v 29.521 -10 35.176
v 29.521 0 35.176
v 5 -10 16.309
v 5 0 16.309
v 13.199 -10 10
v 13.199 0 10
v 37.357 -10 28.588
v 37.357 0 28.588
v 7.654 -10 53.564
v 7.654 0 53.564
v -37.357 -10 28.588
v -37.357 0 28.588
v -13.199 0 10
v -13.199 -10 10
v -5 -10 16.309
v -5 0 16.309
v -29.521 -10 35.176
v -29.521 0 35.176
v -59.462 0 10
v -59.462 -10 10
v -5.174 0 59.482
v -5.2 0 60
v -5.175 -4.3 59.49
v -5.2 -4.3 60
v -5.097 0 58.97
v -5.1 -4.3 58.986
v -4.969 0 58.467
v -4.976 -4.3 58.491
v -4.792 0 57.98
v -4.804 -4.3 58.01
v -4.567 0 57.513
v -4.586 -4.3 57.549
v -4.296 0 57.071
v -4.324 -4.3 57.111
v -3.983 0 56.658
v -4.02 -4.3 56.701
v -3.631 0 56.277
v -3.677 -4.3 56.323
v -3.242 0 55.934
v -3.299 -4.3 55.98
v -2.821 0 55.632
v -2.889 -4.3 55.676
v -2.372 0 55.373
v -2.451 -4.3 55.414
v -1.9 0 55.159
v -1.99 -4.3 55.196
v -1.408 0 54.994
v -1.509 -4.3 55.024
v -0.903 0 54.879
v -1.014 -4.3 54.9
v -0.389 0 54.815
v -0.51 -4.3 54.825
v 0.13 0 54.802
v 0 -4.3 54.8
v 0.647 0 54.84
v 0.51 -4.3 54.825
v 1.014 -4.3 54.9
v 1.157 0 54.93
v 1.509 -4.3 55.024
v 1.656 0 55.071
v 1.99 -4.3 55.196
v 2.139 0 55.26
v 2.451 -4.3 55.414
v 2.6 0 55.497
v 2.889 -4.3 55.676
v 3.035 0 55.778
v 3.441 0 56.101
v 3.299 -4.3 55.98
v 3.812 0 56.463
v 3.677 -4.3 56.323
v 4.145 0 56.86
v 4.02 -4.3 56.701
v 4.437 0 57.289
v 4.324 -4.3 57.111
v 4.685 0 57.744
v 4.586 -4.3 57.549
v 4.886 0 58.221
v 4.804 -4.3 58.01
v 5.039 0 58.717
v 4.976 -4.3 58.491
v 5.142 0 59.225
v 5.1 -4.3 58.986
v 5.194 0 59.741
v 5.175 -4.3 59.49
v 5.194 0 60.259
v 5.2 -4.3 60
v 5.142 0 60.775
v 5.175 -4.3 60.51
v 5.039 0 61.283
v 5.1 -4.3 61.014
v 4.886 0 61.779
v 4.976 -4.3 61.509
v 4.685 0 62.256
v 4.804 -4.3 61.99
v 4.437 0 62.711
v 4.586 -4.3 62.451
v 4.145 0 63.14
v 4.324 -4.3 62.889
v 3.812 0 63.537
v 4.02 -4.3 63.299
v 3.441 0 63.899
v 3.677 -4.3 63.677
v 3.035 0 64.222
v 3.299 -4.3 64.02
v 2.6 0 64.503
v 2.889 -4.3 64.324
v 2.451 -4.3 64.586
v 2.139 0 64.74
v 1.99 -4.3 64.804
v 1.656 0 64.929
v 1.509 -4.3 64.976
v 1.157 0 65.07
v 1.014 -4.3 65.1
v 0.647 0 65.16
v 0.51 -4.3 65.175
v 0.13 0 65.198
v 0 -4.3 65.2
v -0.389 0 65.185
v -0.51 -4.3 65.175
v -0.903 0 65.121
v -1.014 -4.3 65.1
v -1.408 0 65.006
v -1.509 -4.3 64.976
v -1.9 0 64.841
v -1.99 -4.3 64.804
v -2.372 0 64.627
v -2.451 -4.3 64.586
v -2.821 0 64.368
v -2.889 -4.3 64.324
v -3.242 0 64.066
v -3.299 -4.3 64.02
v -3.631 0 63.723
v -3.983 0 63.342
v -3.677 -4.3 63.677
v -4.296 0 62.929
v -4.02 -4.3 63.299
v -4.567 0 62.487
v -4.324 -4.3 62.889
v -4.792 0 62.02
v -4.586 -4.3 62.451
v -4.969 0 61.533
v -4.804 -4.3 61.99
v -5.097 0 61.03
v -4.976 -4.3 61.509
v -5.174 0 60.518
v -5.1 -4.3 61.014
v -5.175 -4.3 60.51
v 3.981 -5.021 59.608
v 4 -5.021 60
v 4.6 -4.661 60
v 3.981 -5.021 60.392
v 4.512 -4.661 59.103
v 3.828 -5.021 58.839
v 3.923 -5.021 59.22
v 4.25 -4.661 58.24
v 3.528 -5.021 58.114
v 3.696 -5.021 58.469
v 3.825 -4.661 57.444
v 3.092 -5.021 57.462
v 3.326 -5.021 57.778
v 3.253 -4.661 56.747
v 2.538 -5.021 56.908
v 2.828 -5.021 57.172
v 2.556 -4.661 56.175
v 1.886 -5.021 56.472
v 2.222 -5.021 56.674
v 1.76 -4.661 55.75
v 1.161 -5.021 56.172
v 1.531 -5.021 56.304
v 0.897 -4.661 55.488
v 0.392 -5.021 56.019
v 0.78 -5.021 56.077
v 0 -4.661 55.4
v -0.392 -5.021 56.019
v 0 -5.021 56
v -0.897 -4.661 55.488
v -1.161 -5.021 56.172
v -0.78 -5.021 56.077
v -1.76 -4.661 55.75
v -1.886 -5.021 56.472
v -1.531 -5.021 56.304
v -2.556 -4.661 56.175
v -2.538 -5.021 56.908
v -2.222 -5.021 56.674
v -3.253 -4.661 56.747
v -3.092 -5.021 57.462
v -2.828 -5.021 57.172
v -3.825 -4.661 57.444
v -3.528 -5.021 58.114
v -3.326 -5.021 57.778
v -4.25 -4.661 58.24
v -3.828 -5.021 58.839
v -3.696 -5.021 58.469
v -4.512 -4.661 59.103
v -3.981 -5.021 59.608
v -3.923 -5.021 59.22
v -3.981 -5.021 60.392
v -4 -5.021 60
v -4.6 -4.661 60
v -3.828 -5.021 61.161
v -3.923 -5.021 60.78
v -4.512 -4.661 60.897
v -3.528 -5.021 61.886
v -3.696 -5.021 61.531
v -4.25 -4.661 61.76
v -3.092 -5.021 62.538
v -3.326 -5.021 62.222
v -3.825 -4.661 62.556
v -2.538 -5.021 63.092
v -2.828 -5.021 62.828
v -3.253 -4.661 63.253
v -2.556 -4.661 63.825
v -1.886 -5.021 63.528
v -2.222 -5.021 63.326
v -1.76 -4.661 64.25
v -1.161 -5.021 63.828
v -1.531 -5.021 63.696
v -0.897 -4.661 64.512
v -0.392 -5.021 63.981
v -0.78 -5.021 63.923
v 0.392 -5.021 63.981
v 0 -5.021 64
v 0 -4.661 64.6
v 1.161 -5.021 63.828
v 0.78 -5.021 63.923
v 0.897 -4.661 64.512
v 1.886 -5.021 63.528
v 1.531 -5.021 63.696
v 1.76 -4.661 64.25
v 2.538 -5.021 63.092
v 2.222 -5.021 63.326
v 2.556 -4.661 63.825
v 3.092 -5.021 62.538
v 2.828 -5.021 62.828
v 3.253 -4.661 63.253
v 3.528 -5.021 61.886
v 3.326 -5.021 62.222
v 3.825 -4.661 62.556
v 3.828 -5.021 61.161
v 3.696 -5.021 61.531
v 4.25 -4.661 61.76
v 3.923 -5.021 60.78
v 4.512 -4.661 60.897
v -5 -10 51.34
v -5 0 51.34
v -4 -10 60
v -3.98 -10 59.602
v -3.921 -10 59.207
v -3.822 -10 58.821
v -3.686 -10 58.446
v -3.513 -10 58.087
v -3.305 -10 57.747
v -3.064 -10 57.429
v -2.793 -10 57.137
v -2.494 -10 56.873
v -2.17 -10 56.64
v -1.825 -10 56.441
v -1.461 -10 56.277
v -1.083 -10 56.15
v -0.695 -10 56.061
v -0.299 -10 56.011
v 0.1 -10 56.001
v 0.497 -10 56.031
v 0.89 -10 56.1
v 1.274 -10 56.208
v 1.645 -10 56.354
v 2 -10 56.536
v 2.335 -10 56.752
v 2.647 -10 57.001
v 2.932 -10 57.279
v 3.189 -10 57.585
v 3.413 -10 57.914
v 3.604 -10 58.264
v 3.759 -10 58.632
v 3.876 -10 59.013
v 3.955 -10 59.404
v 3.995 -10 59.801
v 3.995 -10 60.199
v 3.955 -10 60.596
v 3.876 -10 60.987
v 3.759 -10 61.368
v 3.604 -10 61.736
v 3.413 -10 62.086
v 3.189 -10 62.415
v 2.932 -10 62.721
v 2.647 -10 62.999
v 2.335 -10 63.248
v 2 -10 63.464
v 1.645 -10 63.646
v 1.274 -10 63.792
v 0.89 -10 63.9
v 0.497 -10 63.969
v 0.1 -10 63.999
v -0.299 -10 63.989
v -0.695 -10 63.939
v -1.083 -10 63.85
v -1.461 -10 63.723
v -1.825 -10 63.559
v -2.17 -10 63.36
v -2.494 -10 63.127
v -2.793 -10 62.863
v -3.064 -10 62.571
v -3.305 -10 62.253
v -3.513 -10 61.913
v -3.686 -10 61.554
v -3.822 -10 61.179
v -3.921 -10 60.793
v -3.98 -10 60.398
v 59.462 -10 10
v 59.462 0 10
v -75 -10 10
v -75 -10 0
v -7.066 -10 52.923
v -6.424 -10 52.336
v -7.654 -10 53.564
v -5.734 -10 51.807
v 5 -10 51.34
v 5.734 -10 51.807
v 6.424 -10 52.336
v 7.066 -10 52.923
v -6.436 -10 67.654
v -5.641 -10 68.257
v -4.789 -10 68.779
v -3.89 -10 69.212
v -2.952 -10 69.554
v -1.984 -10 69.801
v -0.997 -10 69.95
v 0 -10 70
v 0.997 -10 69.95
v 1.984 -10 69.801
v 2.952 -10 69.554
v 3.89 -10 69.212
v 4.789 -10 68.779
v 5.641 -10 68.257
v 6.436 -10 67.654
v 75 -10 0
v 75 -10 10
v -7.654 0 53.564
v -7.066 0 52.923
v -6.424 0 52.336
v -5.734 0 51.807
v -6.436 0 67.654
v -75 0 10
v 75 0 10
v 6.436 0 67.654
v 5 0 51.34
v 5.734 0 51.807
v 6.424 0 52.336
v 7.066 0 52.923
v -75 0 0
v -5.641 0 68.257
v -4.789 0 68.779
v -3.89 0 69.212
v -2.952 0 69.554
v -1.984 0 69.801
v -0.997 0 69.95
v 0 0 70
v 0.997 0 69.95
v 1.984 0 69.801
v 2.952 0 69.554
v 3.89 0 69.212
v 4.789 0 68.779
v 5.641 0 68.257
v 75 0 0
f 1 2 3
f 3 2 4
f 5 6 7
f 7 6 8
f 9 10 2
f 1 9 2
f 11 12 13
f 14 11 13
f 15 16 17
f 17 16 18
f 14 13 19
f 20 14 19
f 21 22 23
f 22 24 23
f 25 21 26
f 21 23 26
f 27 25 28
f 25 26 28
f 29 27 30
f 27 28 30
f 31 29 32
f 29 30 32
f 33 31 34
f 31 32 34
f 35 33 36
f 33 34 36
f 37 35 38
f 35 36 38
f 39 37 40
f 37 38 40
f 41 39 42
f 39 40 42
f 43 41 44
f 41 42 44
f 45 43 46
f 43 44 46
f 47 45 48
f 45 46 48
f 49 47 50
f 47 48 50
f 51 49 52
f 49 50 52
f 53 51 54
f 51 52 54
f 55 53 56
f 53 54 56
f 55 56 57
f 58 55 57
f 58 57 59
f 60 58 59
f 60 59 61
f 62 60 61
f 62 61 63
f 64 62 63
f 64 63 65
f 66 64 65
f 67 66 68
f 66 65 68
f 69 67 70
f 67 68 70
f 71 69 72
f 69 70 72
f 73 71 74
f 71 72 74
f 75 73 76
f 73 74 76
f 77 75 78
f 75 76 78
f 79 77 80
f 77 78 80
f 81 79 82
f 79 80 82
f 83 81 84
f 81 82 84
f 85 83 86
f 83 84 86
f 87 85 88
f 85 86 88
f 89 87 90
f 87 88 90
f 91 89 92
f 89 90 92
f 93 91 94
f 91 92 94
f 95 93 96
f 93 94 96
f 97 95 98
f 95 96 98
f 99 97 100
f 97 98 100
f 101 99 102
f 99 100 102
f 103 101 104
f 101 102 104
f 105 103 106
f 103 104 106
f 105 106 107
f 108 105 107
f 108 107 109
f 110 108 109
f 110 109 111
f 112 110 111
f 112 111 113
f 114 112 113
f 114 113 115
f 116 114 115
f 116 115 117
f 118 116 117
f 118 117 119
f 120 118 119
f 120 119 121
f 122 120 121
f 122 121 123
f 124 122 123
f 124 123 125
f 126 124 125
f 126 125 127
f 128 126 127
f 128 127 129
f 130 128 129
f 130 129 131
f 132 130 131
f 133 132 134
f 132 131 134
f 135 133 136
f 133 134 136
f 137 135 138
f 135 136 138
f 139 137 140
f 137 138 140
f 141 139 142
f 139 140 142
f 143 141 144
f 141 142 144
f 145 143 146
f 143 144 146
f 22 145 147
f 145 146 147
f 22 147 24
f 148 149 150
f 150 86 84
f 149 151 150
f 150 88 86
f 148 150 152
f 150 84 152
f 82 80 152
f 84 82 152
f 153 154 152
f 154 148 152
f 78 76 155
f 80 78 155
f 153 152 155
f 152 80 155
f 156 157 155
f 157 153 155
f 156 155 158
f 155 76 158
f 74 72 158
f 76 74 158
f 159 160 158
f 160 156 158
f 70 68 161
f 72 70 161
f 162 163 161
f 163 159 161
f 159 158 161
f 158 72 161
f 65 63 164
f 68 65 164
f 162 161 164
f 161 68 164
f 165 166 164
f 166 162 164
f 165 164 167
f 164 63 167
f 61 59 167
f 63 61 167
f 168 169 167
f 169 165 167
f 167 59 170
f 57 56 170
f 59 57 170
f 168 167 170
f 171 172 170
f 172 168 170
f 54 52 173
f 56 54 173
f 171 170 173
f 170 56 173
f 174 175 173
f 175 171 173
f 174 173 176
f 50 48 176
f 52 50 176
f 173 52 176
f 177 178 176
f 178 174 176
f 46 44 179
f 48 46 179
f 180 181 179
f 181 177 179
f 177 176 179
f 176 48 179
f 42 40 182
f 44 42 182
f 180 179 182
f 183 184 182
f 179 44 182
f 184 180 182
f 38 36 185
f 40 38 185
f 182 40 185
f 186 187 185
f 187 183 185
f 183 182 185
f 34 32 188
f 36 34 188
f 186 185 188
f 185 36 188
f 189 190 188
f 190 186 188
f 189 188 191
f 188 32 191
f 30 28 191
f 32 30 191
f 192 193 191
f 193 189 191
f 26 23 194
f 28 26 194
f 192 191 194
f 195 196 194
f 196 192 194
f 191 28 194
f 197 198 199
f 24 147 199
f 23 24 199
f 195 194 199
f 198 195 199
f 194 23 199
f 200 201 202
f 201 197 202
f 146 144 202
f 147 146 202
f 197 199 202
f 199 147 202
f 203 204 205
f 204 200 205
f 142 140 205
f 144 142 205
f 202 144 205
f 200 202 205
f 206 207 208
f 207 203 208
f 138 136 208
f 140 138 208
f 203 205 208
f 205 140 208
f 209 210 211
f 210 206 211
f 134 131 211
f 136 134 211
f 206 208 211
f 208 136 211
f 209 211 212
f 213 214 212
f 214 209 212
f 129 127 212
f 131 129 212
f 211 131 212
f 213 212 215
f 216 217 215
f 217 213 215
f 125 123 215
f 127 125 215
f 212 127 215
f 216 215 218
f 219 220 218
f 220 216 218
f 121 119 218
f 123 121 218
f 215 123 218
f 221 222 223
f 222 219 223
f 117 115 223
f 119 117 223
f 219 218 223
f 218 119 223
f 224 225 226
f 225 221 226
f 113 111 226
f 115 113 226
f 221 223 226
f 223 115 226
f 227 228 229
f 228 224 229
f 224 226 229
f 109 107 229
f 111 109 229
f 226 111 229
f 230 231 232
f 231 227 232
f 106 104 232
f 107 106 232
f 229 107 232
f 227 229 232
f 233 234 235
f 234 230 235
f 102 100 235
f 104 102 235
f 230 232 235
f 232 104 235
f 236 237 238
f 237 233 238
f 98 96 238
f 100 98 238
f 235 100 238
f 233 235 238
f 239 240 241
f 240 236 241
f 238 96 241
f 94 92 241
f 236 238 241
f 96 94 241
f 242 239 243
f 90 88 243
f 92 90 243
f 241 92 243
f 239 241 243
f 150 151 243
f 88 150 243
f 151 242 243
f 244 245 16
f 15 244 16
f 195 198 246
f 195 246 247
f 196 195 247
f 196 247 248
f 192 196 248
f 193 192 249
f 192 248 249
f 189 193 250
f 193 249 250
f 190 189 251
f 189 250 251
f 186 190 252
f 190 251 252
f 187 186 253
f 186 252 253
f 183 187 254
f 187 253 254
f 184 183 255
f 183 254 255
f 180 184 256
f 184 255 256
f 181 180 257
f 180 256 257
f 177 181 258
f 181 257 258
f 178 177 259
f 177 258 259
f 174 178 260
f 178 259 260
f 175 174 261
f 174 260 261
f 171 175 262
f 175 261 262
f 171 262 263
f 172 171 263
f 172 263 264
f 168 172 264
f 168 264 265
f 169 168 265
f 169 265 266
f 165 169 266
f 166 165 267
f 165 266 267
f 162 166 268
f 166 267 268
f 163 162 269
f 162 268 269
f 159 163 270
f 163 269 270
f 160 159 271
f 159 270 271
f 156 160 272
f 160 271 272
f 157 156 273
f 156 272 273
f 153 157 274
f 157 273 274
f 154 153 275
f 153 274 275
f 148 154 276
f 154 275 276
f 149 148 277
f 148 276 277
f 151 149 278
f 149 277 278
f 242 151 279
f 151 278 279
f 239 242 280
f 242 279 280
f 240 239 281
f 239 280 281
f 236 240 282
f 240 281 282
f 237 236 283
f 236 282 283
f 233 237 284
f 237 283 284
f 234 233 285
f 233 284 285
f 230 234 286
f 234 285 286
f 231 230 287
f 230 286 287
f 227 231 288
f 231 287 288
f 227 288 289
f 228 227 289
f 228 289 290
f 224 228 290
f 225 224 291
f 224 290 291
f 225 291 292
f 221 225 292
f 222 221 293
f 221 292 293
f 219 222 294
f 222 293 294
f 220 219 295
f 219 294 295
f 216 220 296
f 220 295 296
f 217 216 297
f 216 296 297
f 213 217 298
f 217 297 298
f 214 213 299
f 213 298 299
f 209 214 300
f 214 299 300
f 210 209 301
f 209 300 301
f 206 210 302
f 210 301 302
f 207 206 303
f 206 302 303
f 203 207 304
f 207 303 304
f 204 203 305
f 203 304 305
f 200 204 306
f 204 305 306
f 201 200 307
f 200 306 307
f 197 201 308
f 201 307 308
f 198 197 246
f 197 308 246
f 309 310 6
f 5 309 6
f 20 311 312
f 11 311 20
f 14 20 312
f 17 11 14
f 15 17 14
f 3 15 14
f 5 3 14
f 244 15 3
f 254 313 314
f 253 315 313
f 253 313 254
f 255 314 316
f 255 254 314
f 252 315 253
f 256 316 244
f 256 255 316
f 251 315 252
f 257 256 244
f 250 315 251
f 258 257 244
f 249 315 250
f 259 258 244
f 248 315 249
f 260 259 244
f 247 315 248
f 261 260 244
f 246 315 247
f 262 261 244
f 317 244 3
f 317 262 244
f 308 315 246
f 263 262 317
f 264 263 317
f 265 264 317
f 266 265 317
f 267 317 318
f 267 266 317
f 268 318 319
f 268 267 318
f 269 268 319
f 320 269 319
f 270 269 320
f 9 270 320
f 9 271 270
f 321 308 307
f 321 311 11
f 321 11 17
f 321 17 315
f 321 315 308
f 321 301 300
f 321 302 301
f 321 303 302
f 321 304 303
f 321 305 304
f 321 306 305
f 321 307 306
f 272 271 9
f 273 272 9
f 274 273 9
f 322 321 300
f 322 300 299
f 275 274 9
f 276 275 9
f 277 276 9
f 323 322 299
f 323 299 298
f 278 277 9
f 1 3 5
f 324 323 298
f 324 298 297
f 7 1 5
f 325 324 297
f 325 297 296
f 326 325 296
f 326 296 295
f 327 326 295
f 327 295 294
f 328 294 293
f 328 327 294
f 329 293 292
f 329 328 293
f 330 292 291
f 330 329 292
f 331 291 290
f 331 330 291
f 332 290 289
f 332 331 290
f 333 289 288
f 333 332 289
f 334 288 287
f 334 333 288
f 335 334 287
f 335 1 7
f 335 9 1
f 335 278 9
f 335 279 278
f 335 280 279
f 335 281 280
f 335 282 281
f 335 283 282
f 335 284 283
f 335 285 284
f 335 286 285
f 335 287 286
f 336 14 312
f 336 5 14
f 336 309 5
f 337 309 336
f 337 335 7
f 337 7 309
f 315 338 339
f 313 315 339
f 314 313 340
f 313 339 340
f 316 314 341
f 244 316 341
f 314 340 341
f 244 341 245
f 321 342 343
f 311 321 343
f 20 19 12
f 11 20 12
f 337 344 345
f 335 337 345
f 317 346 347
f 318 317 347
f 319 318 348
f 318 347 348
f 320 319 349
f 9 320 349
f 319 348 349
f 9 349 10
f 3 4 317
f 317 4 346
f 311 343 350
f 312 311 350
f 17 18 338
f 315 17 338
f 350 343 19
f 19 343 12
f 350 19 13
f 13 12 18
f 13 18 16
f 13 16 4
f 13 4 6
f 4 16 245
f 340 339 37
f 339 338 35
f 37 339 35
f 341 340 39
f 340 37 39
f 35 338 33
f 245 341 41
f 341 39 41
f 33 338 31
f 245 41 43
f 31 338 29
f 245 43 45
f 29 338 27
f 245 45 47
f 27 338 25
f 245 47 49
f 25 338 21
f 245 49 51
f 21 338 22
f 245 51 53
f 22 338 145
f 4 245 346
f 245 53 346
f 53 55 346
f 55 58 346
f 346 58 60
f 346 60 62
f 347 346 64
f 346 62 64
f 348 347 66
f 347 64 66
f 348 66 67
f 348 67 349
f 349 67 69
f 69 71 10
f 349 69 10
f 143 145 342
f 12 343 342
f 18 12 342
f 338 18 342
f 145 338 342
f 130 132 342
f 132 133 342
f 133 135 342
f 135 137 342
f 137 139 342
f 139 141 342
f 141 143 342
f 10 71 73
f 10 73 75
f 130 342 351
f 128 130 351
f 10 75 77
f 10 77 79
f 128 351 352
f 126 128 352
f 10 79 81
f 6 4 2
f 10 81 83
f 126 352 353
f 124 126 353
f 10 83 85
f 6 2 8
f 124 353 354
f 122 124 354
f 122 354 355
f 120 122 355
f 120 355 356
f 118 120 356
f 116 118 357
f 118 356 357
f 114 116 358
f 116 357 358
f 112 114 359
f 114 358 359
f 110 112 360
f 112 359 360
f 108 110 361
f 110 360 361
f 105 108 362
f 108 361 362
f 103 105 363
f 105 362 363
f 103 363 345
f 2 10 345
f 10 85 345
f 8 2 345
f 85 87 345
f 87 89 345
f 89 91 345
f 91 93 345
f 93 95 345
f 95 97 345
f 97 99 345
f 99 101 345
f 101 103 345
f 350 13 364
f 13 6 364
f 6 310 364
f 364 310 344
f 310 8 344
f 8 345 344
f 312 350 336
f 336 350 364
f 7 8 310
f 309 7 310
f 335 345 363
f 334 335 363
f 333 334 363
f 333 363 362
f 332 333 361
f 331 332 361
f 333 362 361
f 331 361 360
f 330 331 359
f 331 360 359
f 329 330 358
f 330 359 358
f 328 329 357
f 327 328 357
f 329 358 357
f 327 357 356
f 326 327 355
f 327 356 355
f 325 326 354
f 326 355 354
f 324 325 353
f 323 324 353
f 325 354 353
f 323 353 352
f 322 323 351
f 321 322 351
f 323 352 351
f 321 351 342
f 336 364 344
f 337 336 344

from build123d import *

# Parameters (mm, degrees)
F1_DEPTH = 10
F2_D     = 8
F2_DEPTH = 25
F2_TIP   = 2.4034424761
F3_D     = 10.4
F3_DEPTH = 4.3
F3_TIP   = 3.1244752189


with BuildPart() as f1:
    # F0 (on Front) → F1 (new body)
    with BuildSketch(Plane.XZ):
        with BuildLine():
            Line((-75, 10), (-75, 0))
            Line((-75, 0), (75, 0))
            Line((75, 0), (75, 10))
            Line((75, 10), (6.4358378053, 67.6537567079))
            ThreePointArc((6.4358378053, 67.6537567079), (0, 70), (-6.4358378053, 67.6537567079))
            Line((-6.4358378053, 67.6537567079), (-75, 10))
        make_face()
        Polygon((-13.1993114793, 10), (-59.46200743, 10), (-37.3569899514, 28.587513636), align=None, mode=Mode.SUBTRACT)
        with BuildLine():
            Line((-29.5214792948, 35.1761834399), (-7.6537567079, 53.5641621947))
            ThreePointArc((-7.6537567079, 53.5641621947), (-6.4238926361, 52.3362148125), (-5, 51.3397459622))
            Line((-5, 51.3397459622), (-5, 16.3087524782))
            Line((-5, 16.3087524782), (-29.5214792948, 35.1761834399))
        make_face(mode=Mode.SUBTRACT)
        Polygon((37.3569899514, 28.587513636), (59.46200743, 10), (13.1993114793, 10), align=None, mode=Mode.SUBTRACT)
        with BuildLine():
            ThreePointArc((5, 51.3397459622), (6.4238926361, 52.3362148125), (7.6537567079, 53.5641621947))
            Line((7.6537567079, 53.5641621947), (29.5214792948, 35.1761834399))
            Line((29.5214792948, 35.1761834399), (5, 16.3087524782))
            Line((5, 16.3087524782), (5, 51.3397459622))
        make_face(mode=Mode.SUBTRACT)
    extrude(amount=F1_DEPTH)

    # F2
    with Locations(Plane(origin=(0, 0, 0), x_dir=(1, 0, 0), z_dir=(0, 1, 0))):
        with Locations((0, -60)):
            Hole(F2_D / 2, depth=F2_DEPTH)
            with Locations((0, 0, -(F2_DEPTH + F2_TIP / 2))):  # 118° drill point
                Cone(0, F2_D / 2, F2_TIP, mode=Mode.SUBTRACT)

    # F3
    with Locations(Plane(origin=(0, 0, 0), x_dir=(1, 0, 0), z_dir=(0, 1, 0))):
        with Locations((0, -60)):
            Hole(F3_D / 2, depth=F3_DEPTH)
            with Locations((0, 0, -(F3_DEPTH + F3_TIP / 2))):  # 118° drill point
                Cone(0, F3_D / 2, F3_TIP, mode=Mode.SUBTRACT)


solid = f1.part
